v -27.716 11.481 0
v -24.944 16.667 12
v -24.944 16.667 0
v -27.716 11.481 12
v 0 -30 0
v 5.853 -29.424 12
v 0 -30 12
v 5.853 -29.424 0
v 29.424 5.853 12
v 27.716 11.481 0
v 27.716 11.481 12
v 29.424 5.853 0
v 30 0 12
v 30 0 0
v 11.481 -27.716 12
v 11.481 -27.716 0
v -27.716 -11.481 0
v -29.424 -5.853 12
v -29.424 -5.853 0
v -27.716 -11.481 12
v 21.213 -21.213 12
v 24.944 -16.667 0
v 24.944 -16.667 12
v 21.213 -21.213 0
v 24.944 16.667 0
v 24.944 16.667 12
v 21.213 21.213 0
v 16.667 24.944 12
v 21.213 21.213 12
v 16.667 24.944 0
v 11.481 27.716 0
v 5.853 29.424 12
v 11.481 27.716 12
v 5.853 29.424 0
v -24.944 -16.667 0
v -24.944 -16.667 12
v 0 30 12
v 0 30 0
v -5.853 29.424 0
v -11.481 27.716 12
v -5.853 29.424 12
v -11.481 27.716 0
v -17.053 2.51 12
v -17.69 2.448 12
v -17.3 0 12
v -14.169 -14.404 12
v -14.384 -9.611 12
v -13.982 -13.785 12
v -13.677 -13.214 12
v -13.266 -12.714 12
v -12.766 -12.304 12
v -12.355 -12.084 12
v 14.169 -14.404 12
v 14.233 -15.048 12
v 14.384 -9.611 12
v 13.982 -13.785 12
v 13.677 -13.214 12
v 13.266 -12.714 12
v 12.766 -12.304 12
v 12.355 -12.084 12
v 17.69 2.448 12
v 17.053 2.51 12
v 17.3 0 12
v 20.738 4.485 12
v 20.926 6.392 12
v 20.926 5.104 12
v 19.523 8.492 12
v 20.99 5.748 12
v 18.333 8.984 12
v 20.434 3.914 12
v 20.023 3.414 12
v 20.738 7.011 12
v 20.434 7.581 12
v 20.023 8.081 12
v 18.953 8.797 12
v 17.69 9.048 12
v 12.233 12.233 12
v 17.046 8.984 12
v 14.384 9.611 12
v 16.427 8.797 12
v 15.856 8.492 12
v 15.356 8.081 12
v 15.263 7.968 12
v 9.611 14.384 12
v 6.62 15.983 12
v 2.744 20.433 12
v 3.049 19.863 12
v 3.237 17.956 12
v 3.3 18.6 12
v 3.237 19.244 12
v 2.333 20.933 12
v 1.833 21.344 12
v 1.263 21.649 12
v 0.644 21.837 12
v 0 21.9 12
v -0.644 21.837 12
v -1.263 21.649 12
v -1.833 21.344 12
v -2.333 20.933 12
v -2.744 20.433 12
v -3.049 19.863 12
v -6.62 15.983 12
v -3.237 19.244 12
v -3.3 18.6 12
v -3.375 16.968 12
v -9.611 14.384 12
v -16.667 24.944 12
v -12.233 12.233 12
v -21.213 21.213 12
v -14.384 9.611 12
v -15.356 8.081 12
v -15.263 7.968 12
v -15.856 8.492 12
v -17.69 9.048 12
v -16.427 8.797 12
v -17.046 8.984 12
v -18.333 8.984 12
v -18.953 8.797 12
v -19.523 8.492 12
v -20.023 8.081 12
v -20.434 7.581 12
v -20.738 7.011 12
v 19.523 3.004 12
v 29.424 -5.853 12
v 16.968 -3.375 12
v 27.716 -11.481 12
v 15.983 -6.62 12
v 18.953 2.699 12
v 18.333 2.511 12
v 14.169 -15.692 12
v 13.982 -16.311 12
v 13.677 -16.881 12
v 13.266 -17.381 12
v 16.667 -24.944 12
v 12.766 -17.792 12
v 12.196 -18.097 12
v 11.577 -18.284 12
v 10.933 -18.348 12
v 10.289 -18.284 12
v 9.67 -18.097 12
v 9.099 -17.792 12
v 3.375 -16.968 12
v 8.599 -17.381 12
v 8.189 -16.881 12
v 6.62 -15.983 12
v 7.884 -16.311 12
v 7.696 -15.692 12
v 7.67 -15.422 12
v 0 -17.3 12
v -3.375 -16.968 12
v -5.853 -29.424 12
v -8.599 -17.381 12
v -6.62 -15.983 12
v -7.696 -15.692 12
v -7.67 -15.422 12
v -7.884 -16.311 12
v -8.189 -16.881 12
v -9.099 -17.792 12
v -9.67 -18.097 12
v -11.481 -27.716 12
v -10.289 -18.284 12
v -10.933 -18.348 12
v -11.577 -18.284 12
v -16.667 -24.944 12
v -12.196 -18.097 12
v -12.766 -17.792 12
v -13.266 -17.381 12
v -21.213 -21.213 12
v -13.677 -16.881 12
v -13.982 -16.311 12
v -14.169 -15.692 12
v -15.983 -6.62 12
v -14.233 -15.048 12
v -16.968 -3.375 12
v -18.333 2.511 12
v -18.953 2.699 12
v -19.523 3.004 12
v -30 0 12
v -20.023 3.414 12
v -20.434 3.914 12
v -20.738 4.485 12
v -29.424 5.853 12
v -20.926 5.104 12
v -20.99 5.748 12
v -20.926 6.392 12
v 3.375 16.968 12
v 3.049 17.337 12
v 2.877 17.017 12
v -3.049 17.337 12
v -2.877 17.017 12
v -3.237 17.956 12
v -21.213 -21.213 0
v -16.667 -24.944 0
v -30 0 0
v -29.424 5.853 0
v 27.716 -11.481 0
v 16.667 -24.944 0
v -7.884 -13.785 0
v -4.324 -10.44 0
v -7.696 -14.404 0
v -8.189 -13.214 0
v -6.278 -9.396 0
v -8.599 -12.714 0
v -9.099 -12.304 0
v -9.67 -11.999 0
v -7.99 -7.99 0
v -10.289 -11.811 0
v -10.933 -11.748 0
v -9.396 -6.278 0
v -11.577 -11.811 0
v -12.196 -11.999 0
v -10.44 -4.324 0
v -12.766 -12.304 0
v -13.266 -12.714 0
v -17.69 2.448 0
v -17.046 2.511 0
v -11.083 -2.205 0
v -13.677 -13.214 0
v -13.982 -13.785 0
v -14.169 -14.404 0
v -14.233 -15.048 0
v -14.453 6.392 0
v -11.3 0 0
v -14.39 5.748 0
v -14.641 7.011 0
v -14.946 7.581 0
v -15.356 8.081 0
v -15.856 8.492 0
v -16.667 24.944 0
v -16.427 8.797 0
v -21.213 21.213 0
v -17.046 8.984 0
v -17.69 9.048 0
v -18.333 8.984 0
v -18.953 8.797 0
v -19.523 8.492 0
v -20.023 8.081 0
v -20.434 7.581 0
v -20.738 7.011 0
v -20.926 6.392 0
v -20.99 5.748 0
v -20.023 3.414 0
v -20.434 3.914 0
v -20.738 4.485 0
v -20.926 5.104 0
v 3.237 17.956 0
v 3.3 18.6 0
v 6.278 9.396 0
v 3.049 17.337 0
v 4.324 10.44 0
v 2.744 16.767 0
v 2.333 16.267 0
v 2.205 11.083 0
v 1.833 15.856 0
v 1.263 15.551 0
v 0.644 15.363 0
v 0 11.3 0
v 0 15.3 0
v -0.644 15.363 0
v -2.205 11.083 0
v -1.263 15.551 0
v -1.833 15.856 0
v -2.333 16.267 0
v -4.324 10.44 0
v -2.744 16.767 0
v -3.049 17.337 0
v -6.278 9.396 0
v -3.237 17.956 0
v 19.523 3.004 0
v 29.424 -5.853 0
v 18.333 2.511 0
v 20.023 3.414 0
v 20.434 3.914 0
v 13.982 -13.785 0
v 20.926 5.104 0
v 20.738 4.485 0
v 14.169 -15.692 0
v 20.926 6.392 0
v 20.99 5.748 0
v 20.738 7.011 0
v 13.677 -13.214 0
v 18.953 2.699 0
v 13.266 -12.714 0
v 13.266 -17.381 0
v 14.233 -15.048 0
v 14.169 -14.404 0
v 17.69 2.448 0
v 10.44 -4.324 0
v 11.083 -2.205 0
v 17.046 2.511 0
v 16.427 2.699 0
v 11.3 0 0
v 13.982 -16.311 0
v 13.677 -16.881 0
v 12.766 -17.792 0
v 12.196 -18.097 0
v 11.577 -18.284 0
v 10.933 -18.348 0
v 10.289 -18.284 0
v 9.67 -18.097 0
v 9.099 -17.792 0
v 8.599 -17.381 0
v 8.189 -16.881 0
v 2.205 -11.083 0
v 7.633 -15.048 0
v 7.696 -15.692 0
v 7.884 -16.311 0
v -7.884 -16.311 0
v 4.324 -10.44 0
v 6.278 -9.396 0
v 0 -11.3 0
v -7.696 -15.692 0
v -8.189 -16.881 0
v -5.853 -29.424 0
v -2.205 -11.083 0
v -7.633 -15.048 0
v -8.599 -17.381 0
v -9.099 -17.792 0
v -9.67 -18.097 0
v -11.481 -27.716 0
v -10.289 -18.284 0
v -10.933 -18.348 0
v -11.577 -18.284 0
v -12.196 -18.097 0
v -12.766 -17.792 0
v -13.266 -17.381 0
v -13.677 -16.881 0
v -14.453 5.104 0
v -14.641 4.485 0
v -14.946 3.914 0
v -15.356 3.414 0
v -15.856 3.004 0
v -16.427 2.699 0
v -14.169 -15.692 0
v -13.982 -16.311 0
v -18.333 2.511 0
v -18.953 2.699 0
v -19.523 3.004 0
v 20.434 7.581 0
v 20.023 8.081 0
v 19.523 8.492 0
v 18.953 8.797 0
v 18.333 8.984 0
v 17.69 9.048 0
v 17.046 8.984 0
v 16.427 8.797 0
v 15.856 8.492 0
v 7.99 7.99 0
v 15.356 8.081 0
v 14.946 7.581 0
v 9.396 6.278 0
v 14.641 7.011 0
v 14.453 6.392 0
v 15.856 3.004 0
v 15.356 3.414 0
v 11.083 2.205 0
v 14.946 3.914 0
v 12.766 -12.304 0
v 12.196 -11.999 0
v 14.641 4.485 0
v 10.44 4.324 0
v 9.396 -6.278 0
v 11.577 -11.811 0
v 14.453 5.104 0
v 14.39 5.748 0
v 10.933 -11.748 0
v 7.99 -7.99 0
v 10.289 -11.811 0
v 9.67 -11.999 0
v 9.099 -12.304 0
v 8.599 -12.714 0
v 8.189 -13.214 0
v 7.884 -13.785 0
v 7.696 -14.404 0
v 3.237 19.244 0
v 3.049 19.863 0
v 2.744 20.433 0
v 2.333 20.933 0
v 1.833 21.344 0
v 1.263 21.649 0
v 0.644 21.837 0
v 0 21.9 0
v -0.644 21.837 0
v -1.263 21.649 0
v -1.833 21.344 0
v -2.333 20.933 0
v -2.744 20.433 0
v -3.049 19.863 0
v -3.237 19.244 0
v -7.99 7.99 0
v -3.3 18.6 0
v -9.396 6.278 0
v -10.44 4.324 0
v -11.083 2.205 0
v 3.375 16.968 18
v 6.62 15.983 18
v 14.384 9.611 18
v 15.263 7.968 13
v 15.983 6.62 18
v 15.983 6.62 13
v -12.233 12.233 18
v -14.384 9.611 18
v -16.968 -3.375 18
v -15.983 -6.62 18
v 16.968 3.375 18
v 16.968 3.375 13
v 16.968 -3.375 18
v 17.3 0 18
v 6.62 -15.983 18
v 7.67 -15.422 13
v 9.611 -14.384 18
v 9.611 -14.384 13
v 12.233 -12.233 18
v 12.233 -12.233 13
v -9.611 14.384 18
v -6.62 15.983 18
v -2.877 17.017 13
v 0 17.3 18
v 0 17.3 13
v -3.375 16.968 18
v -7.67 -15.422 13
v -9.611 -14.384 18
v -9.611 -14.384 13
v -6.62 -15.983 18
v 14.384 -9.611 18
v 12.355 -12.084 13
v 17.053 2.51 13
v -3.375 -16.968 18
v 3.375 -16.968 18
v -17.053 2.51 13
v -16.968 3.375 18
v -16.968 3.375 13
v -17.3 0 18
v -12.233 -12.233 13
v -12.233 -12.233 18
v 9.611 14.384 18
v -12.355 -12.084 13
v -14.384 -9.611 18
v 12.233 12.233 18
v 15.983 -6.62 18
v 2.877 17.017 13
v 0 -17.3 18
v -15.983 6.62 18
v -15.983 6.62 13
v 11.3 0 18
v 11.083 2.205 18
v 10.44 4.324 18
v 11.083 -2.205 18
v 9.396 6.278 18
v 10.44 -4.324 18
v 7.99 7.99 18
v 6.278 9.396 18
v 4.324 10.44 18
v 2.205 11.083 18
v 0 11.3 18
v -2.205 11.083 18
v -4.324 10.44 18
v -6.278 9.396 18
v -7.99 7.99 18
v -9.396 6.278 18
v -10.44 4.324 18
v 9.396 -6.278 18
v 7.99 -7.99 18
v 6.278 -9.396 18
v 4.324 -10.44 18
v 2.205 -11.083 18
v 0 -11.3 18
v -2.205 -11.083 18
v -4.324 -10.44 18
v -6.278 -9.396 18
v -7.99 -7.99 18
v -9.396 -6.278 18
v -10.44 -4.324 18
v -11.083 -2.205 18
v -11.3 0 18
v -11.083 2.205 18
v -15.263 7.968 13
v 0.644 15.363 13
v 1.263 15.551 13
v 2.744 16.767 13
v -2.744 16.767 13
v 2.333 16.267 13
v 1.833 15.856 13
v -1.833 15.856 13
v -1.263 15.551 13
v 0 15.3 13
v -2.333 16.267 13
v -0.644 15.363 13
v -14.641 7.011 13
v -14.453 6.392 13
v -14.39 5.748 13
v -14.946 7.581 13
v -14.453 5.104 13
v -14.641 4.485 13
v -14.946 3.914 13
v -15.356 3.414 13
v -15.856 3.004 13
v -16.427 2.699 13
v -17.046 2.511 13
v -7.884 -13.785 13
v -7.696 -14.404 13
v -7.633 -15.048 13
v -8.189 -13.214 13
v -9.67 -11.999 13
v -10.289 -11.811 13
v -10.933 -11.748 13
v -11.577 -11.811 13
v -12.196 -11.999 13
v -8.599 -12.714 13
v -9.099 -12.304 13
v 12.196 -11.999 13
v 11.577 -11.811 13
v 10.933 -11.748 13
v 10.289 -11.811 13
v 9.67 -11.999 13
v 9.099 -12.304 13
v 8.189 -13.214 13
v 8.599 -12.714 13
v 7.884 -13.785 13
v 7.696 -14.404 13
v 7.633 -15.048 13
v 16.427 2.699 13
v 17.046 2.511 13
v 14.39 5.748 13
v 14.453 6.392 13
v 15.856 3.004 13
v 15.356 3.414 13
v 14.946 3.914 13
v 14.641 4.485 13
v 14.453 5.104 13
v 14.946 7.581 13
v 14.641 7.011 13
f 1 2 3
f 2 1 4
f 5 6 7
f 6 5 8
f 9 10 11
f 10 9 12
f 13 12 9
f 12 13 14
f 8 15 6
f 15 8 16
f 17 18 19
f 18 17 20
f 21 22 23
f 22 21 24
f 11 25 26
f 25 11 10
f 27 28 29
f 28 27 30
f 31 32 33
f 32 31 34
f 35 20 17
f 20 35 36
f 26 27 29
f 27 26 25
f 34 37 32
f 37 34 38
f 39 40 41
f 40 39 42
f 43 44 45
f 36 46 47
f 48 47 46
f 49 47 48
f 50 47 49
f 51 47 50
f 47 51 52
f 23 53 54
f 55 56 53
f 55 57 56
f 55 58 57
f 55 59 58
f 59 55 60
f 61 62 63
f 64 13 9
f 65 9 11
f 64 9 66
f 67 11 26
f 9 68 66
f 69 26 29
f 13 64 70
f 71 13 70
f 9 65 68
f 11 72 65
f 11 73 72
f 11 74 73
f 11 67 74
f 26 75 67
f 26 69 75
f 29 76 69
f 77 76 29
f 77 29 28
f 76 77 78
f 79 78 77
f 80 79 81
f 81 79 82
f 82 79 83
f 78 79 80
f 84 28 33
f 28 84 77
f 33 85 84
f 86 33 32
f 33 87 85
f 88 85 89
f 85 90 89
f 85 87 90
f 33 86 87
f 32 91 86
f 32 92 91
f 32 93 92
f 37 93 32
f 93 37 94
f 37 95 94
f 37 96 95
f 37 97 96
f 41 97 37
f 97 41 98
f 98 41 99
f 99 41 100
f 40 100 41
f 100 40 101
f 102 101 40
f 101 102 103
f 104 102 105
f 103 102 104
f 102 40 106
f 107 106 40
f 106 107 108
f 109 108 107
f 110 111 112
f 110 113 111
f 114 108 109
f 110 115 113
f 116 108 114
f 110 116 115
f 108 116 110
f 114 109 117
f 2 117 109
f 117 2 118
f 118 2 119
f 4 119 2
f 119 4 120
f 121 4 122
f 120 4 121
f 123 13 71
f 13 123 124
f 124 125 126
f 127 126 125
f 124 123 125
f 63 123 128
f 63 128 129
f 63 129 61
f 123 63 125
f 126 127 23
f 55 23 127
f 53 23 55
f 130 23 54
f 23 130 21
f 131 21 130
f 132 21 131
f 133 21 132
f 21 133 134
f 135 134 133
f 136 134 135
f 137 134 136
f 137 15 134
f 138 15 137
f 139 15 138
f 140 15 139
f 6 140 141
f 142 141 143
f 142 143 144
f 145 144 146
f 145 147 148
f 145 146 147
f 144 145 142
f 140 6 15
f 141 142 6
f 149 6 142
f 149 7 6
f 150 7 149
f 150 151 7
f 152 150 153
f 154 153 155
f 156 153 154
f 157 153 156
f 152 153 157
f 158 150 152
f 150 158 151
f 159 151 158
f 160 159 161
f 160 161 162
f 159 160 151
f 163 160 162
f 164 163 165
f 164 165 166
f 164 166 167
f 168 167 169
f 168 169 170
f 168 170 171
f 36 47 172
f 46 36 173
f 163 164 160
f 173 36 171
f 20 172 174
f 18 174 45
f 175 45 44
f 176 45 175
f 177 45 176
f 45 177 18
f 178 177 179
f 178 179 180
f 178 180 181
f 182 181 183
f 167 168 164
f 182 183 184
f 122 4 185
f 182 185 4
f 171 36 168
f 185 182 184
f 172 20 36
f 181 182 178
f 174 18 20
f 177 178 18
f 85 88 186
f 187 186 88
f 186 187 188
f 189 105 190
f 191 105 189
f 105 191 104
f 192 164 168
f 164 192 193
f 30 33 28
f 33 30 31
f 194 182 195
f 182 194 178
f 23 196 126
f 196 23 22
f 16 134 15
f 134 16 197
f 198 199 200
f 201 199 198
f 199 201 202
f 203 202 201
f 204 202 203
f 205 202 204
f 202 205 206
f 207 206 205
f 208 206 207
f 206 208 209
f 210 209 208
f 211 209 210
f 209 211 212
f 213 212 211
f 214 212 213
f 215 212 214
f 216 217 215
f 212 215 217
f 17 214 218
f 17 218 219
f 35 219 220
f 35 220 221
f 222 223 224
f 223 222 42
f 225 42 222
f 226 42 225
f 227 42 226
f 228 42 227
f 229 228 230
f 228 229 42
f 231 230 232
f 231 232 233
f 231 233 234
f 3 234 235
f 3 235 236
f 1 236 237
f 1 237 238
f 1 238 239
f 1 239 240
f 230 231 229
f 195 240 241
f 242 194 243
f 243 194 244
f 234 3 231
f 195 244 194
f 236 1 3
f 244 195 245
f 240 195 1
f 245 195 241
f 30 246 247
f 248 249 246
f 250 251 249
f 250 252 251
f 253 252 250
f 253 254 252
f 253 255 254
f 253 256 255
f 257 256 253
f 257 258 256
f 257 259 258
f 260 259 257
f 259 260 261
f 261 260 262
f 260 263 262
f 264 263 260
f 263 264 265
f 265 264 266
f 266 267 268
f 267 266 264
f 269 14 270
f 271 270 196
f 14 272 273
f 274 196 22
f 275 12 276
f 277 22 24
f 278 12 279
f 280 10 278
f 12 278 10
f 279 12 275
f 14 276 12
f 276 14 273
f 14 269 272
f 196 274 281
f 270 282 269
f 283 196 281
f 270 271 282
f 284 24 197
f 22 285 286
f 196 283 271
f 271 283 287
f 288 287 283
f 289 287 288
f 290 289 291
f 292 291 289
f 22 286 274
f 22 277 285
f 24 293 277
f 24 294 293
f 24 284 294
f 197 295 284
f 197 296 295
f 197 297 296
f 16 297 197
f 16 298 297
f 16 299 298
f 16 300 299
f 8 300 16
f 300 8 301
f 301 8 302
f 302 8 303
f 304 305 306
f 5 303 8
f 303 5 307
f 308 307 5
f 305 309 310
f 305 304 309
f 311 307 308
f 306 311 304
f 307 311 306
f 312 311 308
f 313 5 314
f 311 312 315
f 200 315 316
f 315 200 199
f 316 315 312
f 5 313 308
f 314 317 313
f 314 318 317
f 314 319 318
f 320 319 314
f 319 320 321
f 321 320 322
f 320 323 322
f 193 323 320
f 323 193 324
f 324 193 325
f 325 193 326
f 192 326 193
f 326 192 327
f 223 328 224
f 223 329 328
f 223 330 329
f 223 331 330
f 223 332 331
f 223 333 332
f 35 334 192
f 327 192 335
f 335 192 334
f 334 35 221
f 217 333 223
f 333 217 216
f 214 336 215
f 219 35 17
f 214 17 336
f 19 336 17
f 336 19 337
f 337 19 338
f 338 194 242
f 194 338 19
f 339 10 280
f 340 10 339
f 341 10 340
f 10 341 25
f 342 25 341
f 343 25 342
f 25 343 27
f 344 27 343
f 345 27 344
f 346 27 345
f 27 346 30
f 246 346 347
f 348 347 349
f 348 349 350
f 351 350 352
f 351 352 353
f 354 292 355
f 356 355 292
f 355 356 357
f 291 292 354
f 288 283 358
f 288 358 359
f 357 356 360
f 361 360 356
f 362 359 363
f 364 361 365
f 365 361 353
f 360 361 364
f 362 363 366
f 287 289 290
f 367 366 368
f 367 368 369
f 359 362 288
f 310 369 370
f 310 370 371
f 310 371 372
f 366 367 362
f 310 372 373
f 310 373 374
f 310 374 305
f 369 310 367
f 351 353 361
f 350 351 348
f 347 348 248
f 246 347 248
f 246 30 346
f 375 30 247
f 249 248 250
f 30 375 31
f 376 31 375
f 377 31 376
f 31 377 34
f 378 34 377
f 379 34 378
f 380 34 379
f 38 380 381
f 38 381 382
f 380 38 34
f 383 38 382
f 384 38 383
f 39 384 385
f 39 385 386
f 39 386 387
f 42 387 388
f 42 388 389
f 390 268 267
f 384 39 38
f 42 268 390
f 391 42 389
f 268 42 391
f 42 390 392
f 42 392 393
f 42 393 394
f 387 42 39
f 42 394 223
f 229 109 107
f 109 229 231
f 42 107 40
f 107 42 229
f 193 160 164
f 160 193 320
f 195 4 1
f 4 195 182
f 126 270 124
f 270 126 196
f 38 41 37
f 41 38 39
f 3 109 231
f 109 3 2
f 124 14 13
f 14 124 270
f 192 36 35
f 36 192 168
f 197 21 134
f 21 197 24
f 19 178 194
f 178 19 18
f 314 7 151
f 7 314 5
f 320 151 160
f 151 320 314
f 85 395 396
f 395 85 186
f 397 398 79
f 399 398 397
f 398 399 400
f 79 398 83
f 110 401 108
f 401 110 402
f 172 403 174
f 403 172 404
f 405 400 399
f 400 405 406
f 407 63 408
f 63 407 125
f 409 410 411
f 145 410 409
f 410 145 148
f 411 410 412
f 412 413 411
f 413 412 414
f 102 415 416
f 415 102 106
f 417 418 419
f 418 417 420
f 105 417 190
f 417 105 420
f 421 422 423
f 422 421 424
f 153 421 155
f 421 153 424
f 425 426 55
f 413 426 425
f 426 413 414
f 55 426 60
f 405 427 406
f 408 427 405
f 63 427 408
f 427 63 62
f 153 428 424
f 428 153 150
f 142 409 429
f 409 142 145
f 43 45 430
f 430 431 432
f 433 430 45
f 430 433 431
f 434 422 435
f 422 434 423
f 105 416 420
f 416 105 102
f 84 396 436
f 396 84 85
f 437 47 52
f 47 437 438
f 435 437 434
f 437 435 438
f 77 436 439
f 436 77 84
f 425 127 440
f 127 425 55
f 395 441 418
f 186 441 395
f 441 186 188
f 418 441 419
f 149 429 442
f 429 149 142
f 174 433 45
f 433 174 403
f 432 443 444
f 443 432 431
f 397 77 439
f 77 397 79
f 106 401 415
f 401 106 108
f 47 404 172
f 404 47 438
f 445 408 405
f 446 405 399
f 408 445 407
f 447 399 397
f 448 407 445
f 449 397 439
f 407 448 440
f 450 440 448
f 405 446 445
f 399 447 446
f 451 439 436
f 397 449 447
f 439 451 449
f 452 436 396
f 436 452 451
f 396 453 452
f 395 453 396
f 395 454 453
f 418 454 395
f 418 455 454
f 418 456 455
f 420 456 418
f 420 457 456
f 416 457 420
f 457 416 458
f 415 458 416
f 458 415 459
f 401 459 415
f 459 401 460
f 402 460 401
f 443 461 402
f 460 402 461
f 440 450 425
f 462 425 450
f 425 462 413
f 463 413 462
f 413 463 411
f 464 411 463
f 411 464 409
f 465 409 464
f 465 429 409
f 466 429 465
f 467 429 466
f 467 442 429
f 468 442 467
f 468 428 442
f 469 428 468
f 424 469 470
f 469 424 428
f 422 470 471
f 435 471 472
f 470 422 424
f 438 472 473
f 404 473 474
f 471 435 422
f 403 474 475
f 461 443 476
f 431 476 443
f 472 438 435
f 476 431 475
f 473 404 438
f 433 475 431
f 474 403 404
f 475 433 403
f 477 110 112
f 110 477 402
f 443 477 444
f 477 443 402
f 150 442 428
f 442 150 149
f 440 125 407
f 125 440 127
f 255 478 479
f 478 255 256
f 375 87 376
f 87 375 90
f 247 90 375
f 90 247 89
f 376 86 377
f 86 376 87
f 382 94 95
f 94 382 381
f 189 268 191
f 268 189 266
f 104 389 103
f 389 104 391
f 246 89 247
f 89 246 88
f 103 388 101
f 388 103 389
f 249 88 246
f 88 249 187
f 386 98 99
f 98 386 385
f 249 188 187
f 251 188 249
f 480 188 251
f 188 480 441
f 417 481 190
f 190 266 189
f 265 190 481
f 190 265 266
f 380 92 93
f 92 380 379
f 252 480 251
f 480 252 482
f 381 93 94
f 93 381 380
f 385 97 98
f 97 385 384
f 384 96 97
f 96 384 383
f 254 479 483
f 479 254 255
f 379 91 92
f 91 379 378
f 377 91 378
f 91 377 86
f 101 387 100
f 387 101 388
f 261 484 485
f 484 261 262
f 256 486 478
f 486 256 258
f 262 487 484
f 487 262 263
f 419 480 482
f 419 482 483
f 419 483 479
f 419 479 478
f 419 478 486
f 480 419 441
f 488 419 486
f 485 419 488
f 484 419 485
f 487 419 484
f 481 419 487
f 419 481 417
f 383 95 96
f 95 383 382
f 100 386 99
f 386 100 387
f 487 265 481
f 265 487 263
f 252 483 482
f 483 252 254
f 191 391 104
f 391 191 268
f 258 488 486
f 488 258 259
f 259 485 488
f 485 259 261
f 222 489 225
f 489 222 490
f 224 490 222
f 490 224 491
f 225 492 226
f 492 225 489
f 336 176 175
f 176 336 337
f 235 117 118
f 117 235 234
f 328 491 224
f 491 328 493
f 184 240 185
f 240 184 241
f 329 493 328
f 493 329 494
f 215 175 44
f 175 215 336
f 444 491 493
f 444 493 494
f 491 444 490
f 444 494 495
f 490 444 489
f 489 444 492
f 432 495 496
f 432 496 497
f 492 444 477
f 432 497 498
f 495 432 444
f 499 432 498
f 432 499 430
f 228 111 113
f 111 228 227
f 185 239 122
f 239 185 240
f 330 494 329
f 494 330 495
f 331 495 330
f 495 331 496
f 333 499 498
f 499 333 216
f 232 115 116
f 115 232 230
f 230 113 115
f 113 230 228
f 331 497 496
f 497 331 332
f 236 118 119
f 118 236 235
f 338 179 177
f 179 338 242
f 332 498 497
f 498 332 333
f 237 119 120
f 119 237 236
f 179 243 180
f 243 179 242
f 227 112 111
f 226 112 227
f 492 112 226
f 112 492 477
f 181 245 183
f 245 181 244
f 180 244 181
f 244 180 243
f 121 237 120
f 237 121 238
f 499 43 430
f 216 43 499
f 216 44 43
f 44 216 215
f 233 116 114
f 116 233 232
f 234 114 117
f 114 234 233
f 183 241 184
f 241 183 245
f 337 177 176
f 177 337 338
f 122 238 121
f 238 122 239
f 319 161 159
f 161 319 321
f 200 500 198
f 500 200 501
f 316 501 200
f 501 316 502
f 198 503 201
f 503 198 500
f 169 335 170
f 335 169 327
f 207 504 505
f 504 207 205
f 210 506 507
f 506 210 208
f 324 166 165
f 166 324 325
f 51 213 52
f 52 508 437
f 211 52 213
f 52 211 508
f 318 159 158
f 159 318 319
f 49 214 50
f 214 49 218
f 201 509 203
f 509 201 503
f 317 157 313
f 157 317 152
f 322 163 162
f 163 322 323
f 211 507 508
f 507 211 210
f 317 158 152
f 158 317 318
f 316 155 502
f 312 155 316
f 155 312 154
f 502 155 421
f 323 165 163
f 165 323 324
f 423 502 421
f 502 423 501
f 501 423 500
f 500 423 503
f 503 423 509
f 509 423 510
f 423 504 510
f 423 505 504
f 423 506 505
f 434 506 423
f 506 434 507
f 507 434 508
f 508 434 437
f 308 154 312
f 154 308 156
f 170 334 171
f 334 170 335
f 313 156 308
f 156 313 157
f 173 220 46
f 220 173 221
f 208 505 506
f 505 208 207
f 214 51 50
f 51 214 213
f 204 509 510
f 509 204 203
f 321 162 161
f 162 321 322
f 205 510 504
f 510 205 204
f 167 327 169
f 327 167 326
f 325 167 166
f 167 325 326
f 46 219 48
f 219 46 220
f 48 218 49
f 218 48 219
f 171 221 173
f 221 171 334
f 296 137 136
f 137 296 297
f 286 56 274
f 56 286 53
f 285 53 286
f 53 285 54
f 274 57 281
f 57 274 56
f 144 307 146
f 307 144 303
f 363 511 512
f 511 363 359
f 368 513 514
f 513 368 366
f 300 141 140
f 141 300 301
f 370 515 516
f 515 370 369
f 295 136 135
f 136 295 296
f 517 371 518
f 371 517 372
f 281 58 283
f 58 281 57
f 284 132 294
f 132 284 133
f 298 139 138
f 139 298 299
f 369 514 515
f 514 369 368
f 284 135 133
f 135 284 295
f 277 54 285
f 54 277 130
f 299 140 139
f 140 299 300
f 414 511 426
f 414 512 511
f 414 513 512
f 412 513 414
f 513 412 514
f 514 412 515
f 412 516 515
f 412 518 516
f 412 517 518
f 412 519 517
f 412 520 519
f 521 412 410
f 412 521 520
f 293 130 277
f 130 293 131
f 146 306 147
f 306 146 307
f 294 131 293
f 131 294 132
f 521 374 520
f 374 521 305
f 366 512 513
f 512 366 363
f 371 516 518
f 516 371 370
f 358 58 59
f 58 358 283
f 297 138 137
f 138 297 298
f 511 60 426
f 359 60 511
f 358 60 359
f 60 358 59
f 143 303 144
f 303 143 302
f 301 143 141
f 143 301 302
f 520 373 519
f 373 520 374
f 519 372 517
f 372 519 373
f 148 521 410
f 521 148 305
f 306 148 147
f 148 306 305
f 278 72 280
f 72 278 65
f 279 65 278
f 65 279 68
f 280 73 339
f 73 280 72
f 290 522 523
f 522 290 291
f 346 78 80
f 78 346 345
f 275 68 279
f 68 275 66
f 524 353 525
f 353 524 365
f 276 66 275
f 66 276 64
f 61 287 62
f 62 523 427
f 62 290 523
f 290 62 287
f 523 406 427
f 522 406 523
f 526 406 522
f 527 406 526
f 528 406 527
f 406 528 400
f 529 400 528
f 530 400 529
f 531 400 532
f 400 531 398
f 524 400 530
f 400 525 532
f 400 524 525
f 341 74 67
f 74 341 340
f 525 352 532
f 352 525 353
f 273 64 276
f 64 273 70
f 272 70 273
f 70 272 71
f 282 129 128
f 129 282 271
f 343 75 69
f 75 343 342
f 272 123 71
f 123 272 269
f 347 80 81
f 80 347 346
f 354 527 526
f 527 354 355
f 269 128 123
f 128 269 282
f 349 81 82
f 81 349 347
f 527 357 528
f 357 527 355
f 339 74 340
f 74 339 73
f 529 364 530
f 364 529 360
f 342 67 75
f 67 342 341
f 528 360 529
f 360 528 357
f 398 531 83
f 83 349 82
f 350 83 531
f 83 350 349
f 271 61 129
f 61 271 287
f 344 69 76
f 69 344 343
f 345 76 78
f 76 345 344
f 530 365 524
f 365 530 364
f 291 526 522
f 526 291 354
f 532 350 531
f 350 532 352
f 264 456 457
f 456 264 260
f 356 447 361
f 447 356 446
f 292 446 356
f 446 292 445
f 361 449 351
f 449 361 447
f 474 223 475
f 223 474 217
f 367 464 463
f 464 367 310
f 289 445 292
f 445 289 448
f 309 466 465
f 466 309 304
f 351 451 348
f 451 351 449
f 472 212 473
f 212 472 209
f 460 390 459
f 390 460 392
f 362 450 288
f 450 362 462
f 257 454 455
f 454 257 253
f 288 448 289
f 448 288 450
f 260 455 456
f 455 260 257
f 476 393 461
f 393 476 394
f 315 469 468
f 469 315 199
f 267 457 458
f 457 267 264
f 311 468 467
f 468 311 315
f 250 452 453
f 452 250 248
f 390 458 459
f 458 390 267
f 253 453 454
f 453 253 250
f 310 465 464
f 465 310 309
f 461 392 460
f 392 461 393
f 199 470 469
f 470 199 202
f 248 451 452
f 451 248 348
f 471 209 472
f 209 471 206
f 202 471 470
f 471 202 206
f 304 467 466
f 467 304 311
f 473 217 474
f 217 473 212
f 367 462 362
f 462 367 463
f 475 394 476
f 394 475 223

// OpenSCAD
$fn = 32;

// ----------------------------------------------------------------------
// Flange Ø60 x 12
// 5 holes on a Ø37.2 bolt circle, bolted joints
// ----------------------------------------------------------------------

// --- parameters (mm) ---
flange_d = 60;   // outside diameter of the flange
thickness = 12;  // flange thickness
holes = 5;       // number of bolt holes
pcd = 37.2;      // bolt circle diameter
start_deg = 90;  // angle of the first hole, from +X
hole_d = 6.6;    // bolt hole diameter
bore_d = 22.6;   // central through bore
hub_d = 34.6;    // hub outside diameter
hub_h = 6;       // hub height above the flange face (0 = no hub)

// --- derived feature positions (mm) ---
height = thickness + hub_h;  // = 18   overall height of the part
pcd_r = pcd / 2;             // = 18.6   bolt circle radius
hole_step = 360 / holes;     // = 72   angular pitch
feature_centers = [
  [pcd_r * cos(start_deg + 0 * hole_step), pcd_r * sin(start_deg + 0 * hole_step)],
  [pcd_r * cos(start_deg + 1 * hole_step), pcd_r * sin(start_deg + 1 * hole_step)],
  [pcd_r * cos(start_deg + 2 * hole_step), pcd_r * sin(start_deg + 2 * hole_step)],
  [pcd_r * cos(start_deg + 3 * hole_step), pcd_r * sin(start_deg + 3 * hole_step)],
  [pcd_r * cos(start_deg + 4 * hole_step), pcd_r * sin(start_deg + 4 * hole_step)]
];   // bolt hole centres on the pitch circle

// flange disc, every hole and the bore cut straight through
difference() {
  union() {
    cylinder(d = flange_d, h = thickness);
    cylinder(d = hub_d, h = height);  // hub, overlapped into the flange
  }
  translate([0, 0, -1]) cylinder(d = bore_d, h = height + 2);  // bore, through
  for (centre = feature_centers)
    translate([centre[0], centre[1], -1]) cylinder(d = hole_d, h = thickness + 2);
}
